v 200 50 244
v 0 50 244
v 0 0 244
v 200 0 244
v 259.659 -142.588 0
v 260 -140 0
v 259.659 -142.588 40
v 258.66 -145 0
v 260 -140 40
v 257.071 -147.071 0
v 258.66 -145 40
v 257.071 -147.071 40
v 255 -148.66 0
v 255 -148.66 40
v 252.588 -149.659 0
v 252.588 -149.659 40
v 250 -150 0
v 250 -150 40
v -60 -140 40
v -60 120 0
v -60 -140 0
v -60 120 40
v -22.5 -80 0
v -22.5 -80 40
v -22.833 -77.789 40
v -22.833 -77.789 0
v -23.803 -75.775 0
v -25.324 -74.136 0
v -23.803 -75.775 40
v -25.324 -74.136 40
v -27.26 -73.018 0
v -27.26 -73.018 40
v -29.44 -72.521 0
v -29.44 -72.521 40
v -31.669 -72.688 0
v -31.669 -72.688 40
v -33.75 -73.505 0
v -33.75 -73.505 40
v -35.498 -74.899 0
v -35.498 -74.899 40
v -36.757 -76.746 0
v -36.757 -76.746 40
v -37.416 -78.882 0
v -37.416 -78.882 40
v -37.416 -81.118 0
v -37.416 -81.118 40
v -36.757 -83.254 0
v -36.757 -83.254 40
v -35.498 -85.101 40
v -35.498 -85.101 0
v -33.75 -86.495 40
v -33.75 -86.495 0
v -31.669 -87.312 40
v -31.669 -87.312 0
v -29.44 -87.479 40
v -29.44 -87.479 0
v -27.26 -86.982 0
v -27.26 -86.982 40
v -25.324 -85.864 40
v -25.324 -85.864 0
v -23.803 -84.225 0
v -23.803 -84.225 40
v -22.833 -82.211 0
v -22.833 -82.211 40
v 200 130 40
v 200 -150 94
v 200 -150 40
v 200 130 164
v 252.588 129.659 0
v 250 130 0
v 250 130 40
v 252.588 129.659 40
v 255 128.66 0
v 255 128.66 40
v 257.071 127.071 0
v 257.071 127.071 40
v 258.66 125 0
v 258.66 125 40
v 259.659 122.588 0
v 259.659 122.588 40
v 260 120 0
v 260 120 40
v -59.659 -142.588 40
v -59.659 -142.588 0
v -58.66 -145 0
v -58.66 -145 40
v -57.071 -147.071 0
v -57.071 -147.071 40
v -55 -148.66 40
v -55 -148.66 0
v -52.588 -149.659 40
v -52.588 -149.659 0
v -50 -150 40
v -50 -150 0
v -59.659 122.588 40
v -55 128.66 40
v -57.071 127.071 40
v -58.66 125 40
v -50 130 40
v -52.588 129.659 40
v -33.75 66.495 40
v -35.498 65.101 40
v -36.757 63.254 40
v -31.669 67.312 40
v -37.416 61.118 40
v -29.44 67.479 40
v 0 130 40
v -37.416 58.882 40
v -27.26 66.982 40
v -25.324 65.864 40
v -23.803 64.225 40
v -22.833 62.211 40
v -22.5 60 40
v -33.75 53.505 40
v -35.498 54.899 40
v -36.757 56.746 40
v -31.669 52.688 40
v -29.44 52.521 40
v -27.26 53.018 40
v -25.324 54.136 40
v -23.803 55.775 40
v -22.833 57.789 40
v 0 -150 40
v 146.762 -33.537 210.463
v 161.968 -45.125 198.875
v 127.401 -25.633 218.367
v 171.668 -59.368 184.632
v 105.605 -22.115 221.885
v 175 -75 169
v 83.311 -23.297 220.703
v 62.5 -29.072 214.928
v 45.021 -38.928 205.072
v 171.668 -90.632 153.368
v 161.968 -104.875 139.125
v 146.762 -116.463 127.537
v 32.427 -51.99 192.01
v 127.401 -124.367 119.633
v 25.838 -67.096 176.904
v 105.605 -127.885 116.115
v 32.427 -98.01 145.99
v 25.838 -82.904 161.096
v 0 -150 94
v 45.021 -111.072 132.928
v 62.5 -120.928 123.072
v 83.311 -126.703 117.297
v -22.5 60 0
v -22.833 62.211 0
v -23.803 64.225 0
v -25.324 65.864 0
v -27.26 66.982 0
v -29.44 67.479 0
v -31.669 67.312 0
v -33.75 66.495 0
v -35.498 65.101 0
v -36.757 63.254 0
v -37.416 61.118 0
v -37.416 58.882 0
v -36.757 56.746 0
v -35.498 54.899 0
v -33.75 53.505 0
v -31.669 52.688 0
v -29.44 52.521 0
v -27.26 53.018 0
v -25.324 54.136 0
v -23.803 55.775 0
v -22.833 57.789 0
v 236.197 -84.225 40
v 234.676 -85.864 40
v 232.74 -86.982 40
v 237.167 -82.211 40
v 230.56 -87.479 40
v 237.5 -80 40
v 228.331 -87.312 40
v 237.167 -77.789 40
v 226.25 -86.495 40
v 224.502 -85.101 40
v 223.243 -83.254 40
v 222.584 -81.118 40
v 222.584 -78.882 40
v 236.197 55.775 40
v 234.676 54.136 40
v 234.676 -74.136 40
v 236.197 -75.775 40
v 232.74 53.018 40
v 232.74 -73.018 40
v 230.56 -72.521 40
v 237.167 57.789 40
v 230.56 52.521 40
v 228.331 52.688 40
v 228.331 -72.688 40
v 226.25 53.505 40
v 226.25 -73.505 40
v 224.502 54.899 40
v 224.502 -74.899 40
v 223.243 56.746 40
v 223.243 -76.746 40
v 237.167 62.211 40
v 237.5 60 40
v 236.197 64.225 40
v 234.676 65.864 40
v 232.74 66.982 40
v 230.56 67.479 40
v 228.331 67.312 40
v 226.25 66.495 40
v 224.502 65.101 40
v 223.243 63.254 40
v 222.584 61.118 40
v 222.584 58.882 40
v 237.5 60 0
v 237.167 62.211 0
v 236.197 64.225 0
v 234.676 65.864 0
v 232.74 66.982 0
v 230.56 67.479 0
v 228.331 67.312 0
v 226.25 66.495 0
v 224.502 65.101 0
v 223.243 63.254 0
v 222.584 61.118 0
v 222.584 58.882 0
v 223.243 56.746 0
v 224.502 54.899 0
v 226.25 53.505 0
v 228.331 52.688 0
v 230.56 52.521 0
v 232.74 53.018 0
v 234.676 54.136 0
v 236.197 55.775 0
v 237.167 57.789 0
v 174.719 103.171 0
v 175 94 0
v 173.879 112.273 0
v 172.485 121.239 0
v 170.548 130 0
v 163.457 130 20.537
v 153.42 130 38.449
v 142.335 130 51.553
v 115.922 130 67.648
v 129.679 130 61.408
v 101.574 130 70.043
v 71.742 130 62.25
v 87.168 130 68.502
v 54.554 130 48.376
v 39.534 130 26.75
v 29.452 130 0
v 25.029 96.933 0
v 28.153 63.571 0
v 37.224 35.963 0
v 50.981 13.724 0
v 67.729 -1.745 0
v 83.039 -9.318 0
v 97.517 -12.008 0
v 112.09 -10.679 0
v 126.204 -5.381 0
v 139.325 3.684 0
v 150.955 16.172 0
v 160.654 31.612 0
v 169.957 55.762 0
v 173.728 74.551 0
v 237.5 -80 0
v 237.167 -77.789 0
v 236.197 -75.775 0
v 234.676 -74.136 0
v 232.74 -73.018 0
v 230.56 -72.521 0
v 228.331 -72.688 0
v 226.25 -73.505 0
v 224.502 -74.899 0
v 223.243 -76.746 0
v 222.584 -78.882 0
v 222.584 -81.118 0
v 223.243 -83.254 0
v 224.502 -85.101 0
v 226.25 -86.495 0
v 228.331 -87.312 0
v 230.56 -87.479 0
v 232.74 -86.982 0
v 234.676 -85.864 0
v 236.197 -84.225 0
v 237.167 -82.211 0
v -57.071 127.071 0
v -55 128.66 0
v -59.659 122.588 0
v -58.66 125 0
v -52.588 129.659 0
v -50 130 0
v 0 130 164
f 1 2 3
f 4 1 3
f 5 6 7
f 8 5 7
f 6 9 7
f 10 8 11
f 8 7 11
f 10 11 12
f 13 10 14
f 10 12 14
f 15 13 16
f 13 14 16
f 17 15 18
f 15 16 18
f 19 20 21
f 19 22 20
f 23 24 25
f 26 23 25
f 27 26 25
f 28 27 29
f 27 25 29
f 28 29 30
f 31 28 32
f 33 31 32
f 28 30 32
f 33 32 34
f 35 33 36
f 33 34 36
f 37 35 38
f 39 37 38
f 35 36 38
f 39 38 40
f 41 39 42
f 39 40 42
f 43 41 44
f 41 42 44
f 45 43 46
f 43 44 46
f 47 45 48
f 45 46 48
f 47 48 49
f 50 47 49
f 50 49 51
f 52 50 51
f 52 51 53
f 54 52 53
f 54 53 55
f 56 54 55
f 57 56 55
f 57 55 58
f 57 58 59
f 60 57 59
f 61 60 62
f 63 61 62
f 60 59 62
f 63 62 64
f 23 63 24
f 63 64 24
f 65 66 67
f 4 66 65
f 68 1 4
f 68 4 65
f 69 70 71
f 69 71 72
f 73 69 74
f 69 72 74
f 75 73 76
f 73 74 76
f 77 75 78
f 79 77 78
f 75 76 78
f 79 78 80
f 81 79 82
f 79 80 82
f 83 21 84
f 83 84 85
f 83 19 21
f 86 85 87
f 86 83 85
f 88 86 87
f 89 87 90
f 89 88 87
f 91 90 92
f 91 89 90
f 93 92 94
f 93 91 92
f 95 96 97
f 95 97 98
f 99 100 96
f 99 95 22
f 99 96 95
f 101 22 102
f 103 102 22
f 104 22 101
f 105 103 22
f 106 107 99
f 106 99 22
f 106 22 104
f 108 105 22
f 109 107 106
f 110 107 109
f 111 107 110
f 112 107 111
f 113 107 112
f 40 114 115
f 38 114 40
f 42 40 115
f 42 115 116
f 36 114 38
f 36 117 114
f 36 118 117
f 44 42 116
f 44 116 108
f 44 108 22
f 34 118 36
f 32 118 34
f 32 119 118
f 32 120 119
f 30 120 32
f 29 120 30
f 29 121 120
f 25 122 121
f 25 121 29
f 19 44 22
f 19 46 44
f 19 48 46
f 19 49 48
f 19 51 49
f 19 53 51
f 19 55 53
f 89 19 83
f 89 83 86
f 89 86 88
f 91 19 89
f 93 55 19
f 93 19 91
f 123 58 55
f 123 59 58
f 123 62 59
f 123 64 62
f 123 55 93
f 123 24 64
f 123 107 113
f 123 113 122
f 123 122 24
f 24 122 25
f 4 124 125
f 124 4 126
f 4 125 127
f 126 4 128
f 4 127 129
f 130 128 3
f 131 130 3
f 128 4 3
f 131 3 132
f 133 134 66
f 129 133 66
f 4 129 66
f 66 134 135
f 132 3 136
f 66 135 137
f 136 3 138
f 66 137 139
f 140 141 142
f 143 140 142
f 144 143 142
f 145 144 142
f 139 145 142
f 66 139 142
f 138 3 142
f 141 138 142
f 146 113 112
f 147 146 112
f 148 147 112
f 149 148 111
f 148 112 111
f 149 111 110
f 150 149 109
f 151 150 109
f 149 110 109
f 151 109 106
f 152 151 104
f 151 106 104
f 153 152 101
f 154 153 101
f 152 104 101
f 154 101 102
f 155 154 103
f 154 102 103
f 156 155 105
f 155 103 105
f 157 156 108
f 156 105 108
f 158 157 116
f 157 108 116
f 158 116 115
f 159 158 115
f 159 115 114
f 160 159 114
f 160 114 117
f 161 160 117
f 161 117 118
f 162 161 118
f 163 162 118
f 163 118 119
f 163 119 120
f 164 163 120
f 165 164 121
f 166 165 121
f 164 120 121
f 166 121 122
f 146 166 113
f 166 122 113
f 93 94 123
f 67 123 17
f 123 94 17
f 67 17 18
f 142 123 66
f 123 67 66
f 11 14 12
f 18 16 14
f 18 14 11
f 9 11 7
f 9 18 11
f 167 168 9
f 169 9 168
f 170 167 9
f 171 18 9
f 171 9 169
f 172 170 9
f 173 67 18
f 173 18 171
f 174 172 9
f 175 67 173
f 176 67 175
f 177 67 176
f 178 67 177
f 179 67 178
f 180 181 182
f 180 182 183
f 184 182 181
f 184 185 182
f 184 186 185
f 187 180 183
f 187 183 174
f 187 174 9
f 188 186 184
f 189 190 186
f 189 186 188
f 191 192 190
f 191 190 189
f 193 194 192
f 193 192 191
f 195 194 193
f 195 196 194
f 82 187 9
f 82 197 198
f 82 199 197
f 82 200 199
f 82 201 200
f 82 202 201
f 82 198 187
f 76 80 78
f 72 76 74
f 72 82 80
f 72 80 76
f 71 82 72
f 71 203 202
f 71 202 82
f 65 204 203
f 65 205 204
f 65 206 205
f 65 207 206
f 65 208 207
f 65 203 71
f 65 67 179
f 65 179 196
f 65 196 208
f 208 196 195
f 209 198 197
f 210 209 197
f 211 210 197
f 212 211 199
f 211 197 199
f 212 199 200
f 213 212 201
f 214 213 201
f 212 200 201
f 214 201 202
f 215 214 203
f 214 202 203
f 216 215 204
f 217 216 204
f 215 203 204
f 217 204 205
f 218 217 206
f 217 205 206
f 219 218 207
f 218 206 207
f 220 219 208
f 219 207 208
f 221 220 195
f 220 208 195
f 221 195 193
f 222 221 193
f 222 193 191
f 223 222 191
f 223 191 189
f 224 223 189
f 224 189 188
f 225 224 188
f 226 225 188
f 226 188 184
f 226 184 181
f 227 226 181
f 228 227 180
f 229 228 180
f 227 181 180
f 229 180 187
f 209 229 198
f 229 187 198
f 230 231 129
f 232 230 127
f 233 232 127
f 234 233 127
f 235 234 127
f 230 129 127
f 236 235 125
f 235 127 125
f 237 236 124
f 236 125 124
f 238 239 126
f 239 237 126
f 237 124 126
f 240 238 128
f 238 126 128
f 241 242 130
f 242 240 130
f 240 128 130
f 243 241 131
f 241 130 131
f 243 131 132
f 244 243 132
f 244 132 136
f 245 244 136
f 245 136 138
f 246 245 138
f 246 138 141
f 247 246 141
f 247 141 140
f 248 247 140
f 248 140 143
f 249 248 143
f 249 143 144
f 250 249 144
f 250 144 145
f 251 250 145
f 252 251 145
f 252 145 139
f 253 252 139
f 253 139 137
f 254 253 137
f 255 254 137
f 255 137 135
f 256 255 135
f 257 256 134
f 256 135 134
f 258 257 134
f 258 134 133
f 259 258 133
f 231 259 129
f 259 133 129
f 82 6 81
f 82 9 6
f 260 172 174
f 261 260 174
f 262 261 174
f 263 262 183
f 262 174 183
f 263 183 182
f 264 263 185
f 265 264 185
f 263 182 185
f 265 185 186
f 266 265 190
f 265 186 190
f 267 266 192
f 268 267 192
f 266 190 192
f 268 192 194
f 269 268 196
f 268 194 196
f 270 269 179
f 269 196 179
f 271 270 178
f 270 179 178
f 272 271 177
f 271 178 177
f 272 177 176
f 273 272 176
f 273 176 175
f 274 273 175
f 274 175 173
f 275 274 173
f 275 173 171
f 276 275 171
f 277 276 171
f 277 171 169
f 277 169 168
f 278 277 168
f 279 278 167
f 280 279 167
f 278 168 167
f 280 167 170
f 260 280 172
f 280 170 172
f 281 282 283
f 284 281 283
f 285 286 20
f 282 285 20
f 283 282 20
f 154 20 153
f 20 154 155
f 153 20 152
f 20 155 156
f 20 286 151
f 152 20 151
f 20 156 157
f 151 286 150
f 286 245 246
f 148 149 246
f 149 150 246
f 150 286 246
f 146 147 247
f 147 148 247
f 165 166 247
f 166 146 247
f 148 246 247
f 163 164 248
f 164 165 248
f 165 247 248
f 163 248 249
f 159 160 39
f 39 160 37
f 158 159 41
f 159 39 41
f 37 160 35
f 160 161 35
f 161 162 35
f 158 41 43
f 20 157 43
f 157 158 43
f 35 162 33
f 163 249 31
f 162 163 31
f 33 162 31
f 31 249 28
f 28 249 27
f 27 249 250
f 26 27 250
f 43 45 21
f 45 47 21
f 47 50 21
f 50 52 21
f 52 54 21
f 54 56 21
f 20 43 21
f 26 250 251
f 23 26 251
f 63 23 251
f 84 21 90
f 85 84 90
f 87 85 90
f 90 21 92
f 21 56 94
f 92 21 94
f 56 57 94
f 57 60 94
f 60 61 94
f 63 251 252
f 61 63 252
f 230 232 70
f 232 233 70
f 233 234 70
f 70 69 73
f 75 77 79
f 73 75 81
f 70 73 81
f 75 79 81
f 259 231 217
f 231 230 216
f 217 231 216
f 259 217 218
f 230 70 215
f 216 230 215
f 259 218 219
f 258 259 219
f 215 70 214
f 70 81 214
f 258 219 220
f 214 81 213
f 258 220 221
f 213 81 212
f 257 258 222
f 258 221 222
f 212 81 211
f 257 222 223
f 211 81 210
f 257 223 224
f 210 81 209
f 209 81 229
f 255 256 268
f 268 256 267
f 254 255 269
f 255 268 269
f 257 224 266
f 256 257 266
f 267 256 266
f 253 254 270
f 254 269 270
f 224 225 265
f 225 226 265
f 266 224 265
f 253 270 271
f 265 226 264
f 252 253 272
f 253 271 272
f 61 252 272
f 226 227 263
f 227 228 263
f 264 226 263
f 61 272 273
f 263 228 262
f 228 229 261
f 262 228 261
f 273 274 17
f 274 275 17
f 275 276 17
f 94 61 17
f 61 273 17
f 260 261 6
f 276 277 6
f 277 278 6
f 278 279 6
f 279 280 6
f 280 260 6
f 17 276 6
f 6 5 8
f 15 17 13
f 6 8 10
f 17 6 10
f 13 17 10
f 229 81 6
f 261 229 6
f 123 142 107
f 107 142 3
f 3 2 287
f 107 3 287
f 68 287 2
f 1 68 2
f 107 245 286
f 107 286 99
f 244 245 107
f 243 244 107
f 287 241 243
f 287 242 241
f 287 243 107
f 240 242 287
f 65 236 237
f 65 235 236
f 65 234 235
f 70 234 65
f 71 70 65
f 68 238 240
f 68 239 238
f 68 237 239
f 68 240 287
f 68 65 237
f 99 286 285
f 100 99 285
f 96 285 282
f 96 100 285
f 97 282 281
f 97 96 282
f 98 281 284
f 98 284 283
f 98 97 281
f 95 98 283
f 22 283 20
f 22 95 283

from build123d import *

# Parameters (mm, degrees)
F1_DEPTH  = 200
F2_W      = 280
F2_H      = 40
F3_DEPTH  = 60
F4_W      = 280
F4_H      = 40
F5_DEPTH  = 60
F6_R      = 75
F7_DEPTH  = 300
F8_R      = 7.5
F9_DEPTH  = 40
F10_R     = 7.5
F11_DEPTH = 40
F12_R     = 10


with BuildPart() as f1:
    # F0 (on Right) → F1 (new body)
    with BuildSketch(Plane.YZ):
        Polygon((-150, 94), (-150, 0), (130, 0), (130, 164), (50, 244), (0, 244), align=None)
    extrude(amount=F1_DEPTH)

    # F2 (on face) → F3 (join)
    with BuildSketch(Plane.YZ.offset(200)):
        with Locations((-10, 20)):
            Rectangle(F2_W, F2_H)
    extrude(amount=F3_DEPTH)

    # F4 (on face) → F5 (join)
    with BuildSketch(Plane(origin=(0, 0, 0), x_dir=(0, -1, 0), z_dir=(-1, 0, 0))):
        with Locations((10, 20)):
            Rectangle(F4_W, F4_H)
    extrude(amount=F5_DEPTH)

    # F6 (on face) → F7 (cut)
    with BuildSketch(Plane(origin=(0, -122, 122), x_dir=(1, 0, 0), z_dir=(0, -0.707107, 0.707107))):
        with Locations((100, 66.468037)):
            Circle(F6_R)
    extrude(amount=-F7_DEPTH, mode=Mode.SUBTRACT)

    # F8 (on face) → F9 (cut)
    with BuildSketch(Plane.XY.offset(40)):
        with Locations((-30, 60)):
            Circle(F8_R)
        with Locations((-30, -80)):
            Circle(F8_R)
    extrude(amount=-F9_DEPTH, mode=Mode.SUBTRACT)

    # F10 (on face) → F11 (cut)
    with BuildSketch(Plane.XY.offset(40)):
        with Locations((230, 60)):
            Circle(F10_R)
        with Locations((230, -80)):
            Circle(F10_R)
    extrude(amount=-F11_DEPTH, mode=Mode.SUBTRACT)

    # F12
    f12_edges = [f1.edges().sort_by_distance(p)[0] for p in [
        (-60, -150, 20),
        (260, -150, 20),
        (260, 130, 20),
        (-60, 130, 20),
    ]]
    fillet(f12_edges, radius=F12_R)


solid = f1.part
